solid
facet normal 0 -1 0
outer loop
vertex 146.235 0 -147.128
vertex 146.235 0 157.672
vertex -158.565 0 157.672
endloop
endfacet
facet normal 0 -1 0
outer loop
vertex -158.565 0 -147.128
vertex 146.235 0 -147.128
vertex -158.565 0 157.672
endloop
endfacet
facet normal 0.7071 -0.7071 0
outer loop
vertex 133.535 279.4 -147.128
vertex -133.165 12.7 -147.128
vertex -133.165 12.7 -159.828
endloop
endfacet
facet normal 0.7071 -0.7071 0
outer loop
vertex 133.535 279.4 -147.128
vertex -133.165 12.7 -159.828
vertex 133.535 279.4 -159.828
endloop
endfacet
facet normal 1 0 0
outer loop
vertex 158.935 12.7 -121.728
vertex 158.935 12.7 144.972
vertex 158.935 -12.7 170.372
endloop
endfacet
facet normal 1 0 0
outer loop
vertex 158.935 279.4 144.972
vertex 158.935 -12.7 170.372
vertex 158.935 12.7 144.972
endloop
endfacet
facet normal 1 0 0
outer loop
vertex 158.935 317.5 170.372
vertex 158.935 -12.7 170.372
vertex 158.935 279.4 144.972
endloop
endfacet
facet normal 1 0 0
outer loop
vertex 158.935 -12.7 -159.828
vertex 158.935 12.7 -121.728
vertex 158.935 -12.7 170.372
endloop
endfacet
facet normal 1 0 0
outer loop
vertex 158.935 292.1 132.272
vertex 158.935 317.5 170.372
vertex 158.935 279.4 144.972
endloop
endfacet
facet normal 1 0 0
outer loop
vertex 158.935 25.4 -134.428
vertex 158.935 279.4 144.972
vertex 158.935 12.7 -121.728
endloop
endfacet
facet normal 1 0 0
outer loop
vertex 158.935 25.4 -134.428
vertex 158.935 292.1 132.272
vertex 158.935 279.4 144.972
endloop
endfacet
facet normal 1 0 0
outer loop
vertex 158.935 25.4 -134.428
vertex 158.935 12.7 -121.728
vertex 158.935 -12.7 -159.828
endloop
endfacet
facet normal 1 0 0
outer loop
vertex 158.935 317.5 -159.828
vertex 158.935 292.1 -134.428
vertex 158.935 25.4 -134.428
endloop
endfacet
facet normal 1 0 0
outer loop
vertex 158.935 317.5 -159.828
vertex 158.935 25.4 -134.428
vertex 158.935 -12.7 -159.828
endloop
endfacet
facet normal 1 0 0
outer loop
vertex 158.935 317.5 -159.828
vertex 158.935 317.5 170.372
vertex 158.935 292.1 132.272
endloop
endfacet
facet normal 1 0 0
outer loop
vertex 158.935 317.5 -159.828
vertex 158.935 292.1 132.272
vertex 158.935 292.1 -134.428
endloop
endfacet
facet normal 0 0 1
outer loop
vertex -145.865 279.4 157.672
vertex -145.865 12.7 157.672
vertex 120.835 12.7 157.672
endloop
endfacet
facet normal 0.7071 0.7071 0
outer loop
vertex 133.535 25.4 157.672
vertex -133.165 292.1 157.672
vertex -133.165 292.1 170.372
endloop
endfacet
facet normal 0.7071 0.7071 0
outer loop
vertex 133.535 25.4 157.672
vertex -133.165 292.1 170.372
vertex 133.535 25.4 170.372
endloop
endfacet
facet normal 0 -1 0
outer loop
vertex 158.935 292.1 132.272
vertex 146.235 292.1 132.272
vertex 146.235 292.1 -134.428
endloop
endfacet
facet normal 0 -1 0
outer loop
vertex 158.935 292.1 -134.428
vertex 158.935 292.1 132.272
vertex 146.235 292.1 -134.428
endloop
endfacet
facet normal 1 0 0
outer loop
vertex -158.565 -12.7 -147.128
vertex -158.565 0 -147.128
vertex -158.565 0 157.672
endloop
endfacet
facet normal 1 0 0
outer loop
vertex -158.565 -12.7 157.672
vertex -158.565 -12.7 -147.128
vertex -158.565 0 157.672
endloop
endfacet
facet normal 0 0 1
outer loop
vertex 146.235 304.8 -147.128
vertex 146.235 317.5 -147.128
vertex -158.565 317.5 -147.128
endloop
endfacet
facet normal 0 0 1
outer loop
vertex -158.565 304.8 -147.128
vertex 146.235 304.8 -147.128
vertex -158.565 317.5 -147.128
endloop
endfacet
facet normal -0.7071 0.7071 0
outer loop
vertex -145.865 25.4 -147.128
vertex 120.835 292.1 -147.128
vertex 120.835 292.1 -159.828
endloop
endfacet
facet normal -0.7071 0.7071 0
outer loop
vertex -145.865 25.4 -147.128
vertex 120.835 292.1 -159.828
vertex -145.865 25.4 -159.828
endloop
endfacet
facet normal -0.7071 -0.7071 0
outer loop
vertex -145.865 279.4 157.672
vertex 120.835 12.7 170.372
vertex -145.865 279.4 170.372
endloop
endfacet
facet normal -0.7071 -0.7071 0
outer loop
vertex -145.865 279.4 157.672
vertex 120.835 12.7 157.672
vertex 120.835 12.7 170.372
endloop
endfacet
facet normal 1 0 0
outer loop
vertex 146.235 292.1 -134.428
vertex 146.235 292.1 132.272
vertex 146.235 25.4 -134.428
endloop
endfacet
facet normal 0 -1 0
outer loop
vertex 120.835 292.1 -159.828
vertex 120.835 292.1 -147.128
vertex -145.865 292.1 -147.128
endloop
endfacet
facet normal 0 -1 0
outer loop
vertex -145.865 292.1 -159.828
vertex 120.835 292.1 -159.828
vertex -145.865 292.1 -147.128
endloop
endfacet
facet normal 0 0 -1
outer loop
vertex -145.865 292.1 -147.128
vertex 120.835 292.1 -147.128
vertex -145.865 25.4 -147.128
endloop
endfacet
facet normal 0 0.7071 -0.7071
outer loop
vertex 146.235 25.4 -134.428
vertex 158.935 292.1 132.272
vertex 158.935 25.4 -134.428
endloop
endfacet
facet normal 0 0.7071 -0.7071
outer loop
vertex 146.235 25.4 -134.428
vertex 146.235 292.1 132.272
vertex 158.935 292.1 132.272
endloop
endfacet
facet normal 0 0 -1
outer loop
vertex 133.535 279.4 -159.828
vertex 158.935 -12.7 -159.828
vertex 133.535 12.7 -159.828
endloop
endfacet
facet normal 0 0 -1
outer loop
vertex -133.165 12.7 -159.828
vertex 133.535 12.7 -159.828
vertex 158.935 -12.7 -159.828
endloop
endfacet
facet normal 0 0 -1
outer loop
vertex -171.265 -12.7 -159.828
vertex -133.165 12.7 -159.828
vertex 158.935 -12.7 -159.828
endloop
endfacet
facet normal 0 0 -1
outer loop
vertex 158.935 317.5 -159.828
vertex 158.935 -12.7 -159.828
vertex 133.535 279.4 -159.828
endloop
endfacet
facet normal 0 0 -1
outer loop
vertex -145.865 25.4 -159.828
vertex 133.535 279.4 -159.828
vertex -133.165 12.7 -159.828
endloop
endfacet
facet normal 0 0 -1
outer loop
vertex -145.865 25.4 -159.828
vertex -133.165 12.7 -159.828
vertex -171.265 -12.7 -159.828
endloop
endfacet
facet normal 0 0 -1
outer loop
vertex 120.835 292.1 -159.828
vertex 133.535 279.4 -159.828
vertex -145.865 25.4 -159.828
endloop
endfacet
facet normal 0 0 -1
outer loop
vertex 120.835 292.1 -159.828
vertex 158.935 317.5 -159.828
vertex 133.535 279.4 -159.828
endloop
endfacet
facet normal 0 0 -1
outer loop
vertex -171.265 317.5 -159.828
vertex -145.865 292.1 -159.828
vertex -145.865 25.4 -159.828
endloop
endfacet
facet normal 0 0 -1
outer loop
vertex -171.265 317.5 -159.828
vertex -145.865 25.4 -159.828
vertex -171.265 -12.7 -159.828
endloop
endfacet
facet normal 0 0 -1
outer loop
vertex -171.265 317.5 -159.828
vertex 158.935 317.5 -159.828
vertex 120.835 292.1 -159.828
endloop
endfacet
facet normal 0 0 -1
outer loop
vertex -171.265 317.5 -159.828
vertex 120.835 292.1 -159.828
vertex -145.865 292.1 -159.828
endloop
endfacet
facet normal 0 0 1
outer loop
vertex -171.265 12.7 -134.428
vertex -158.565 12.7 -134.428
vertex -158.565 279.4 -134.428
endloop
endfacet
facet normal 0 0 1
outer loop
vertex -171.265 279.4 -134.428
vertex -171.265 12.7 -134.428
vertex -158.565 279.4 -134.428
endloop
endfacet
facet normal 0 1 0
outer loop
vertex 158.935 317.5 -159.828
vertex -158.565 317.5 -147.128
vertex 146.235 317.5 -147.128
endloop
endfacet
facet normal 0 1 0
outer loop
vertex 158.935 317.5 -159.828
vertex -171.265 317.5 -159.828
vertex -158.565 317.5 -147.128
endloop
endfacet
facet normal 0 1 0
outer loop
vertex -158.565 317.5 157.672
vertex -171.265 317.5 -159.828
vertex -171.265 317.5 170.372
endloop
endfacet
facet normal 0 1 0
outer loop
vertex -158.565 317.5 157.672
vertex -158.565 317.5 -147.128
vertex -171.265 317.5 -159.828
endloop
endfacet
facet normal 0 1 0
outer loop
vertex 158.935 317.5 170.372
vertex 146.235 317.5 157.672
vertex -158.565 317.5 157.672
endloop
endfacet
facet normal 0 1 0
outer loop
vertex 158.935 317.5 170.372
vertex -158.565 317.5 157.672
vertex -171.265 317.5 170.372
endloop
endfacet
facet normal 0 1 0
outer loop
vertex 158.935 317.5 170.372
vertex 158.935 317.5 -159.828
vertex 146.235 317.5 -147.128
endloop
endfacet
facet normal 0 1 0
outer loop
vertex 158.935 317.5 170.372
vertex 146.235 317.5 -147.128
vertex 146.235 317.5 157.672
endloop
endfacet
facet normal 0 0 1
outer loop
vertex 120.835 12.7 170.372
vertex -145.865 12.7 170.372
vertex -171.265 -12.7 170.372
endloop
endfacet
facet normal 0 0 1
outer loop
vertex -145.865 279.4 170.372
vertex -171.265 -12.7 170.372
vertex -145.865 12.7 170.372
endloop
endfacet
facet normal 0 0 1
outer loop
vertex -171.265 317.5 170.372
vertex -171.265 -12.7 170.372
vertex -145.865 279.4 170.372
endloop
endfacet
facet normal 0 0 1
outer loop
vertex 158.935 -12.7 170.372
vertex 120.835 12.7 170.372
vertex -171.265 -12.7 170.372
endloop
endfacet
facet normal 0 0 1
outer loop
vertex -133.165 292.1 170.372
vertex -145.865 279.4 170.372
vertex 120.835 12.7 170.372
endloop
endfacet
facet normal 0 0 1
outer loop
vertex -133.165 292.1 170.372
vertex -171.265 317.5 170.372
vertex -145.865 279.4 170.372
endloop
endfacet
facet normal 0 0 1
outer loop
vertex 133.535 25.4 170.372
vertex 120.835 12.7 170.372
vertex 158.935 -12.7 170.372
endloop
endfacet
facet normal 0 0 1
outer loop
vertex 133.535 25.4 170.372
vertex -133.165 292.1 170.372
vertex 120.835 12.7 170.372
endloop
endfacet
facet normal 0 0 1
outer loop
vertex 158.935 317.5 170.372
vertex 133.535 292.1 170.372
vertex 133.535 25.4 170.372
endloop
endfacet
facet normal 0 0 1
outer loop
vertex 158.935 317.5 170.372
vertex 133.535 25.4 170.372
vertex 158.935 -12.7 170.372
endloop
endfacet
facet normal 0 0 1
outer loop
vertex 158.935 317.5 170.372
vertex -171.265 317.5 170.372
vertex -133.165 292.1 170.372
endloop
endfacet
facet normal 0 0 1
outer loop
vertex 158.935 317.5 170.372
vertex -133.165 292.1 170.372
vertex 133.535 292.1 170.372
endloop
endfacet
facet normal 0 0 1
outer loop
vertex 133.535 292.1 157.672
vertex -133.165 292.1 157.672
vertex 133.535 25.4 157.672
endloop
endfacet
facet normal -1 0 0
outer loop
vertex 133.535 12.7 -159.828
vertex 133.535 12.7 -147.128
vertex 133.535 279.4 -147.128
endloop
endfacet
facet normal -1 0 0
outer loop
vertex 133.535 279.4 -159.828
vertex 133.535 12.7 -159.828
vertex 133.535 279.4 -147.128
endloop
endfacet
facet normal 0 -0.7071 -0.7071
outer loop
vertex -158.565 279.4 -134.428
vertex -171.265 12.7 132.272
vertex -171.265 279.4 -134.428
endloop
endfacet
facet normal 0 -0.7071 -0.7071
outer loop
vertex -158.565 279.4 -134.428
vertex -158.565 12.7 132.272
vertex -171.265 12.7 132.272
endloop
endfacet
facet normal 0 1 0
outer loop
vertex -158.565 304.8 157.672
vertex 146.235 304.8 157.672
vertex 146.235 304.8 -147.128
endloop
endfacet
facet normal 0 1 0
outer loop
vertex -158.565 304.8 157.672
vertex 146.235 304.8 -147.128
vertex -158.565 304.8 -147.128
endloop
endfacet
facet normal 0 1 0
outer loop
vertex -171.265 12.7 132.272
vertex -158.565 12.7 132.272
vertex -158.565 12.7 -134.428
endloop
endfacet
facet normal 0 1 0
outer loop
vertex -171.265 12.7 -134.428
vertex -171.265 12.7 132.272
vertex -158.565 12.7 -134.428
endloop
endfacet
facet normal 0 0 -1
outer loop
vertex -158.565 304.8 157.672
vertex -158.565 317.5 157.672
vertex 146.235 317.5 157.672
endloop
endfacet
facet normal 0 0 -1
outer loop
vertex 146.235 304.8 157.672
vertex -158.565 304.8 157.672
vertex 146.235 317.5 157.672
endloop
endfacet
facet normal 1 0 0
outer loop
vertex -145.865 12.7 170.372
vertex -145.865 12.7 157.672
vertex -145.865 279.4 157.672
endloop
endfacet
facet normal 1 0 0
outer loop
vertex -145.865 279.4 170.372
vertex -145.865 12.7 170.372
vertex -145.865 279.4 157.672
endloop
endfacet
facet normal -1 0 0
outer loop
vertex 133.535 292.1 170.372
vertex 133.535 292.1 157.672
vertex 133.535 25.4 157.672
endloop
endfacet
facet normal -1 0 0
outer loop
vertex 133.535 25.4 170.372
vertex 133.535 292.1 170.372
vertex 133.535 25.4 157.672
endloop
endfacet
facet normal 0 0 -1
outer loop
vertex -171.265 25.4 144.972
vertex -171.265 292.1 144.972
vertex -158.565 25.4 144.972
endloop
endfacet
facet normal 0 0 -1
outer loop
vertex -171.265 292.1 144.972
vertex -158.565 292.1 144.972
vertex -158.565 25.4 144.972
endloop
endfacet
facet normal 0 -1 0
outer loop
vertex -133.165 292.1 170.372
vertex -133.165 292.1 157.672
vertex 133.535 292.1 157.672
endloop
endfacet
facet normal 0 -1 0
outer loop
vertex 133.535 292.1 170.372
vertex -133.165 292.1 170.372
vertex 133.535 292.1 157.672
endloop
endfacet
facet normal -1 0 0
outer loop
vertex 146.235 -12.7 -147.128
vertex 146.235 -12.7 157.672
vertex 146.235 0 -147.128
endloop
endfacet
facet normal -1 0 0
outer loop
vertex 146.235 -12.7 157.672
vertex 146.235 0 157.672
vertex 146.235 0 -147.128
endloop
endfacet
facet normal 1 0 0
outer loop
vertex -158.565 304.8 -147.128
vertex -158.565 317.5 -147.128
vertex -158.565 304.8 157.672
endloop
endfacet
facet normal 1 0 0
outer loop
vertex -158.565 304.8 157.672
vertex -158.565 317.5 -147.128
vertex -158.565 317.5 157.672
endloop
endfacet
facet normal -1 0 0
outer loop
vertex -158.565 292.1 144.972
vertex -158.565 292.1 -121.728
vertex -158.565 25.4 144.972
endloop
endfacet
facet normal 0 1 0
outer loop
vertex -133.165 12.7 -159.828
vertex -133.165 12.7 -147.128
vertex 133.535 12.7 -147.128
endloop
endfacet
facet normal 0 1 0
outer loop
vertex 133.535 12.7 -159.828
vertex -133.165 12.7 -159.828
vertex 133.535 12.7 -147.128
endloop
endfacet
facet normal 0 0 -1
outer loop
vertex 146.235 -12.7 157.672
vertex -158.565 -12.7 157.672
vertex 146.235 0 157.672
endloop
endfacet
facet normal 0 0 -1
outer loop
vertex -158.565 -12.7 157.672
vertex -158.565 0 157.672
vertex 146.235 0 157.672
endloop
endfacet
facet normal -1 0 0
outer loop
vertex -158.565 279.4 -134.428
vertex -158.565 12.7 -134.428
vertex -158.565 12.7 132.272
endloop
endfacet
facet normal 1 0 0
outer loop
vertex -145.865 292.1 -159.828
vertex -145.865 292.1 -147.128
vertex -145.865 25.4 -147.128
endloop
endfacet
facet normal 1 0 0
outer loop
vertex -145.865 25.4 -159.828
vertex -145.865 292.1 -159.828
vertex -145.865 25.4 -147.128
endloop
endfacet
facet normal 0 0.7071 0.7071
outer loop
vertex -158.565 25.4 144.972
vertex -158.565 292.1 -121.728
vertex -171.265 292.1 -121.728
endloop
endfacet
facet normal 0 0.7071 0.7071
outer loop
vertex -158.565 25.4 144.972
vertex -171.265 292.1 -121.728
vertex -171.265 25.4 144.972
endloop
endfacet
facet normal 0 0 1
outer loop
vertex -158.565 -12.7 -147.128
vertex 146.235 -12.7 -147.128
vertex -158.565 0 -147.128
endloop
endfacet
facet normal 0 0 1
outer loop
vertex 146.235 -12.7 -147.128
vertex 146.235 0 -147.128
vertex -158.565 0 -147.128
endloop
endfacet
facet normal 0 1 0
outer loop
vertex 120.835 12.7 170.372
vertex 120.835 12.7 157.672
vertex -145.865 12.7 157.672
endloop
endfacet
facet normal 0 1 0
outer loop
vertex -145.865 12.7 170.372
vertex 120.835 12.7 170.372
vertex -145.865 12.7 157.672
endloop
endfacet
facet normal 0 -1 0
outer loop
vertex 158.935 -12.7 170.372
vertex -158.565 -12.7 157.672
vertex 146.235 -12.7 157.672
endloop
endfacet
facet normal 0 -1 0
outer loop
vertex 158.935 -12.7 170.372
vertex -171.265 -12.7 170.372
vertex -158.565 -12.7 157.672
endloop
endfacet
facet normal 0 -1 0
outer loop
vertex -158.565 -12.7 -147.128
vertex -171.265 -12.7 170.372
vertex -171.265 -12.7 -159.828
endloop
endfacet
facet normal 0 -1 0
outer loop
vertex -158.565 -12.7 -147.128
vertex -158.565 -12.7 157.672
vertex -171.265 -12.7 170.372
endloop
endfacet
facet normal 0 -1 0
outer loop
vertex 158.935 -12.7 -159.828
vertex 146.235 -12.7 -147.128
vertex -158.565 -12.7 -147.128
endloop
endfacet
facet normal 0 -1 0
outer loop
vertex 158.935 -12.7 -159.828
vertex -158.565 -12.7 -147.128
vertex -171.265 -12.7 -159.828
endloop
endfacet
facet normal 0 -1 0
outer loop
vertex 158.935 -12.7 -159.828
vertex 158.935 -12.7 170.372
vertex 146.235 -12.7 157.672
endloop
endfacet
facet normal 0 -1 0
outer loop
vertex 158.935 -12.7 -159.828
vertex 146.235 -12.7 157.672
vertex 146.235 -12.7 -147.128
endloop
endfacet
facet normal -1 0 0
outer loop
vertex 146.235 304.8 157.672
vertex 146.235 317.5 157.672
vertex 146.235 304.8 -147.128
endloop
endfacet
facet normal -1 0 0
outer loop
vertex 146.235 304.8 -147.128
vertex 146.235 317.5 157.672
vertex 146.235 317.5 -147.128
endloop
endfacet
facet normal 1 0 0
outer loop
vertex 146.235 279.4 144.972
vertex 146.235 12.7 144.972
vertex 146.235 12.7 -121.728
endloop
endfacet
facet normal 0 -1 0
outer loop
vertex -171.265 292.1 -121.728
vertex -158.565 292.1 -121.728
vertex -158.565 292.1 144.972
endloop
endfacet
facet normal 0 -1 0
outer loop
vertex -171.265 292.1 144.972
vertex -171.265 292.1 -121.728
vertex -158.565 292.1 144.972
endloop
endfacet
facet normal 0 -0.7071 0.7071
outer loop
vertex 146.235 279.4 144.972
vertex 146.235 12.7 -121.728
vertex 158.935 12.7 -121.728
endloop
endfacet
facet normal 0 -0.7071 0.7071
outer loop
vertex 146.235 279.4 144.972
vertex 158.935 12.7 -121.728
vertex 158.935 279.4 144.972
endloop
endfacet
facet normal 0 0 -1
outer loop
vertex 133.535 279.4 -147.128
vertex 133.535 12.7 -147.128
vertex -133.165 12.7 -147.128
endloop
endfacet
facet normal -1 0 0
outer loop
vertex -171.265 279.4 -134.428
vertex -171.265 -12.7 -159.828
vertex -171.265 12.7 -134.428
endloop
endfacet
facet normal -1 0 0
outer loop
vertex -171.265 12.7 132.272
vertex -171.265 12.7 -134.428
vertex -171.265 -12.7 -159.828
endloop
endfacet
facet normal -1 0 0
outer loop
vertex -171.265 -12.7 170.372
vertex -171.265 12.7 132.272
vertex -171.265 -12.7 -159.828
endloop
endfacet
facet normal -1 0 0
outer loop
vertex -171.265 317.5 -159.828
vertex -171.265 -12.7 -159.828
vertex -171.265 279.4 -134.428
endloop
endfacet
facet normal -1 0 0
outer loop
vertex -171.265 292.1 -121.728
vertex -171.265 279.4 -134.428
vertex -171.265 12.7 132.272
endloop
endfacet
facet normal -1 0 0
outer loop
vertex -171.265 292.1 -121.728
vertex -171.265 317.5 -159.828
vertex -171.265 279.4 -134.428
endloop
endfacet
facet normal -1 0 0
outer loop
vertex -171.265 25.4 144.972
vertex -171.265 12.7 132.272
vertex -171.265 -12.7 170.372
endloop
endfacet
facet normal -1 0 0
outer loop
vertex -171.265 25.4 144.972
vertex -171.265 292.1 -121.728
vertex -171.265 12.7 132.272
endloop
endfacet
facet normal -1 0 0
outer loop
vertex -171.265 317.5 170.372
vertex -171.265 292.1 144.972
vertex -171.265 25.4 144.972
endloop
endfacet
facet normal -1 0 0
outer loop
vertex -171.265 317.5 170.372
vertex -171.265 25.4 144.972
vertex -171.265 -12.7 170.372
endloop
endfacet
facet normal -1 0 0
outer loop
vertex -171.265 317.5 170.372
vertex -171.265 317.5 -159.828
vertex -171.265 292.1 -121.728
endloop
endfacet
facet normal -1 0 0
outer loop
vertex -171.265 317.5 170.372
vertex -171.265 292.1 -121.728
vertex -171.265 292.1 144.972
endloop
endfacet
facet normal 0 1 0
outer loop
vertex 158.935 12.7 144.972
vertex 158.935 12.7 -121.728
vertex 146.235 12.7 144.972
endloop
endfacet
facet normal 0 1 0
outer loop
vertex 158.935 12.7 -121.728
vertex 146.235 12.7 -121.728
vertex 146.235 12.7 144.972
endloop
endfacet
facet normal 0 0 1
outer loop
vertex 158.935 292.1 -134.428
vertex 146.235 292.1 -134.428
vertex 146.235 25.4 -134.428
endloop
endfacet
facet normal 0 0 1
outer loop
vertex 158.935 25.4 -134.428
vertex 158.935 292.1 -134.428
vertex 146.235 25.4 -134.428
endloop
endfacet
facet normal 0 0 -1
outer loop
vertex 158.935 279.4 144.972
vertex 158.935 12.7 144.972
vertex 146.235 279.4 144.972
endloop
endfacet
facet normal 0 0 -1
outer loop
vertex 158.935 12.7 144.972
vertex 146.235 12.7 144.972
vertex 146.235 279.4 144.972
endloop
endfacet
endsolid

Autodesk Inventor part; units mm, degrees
ref_plane "YZ Plane" through (0, 0, 0) normal (1, 0, 0) x (0, 1, 0)
ref_plane "XZ Plane" through (0, 0, 0) normal (0, 1, 0) x (-1, 0, 0)
ref_plane "XY Plane" through (0, 0, 0) normal (0, 0, 1) x (1, 0, 0)
sketch "Sketch1" plane through (0, 0, 0) normal (0, 1, 0) x (-1, 0, 0)
  line L0 (158.5647, 157.6724) -> (-146.2353, 157.6724)
  line L1 (-146.2353, 157.6724) -> (-146.2353, -147.1276)
  line L2 (-146.2353, -147.1276) -> (158.5647, -147.1276)
  line L3 (158.5647, -147.1276) -> (158.5647, 157.6724)
  point P0 (0, 0)
  dimension "d0" = 304.8
  dimension "d1" = 304.8
extrude "Extrusion1" add sketch "Sketch1" along normal blind 304.8
sketch "Sketch2" plane through (146.2353, 0, 157.6724) normal (1, 0, 0) x (0, 0, -1)
  line L0 (-12.7, 317.5) -> (317.5, 317.5)
  line L1 (317.5, 317.5) -> (317.5, -12.7)
  line L2 (317.5, -12.7) -> (-12.7, -12.7)
  line L3 (-12.7, -12.7) -> (-12.7, 317.5)
  line L4 (0, 304.8) -> (304.8, 304.8) projected
  line L5 (0, 0) -> (0, 304.8) projected
  line L6 (12.7, 292.1) -> (292.1, 292.1)
  line L7 (292.1, 292.1) -> (292.1, 12.7)
  line L8 (292.1, 12.7) -> (12.7, 12.7)
  line L9 (12.7, 12.7) -> (12.7, 292.1)
  line L10 (25.4, 292.1) -> (292.1, 25.4)
  line L11 (279.4, 12.7) -> (12.7, 279.4)
  point P0 (157.6724, 0)
  dimension "d4" = 330.2
  dimension "d5" = 330.2
  dimension "d6" = 12.7
  dimension "d7" = 12.7
  dimension "d8" = 25.4
  dimension "d9" = 25.4
  dimension "d10" = 25.4
  dimension "d11" = 25.4
  dimension "d17" = 12.7
  dimension "d18" = 12.7
  dimension "d19" = 12.7
extrude "Extrusion2" add sketch "Sketch2" along normal blind 12.7 contours L0 L1 L2 L3 | L6 L10 L7 L8 L11 L9
ref_plane "Work Plane1" through (-6.1647, 0, -147.1276) normal (-1, 0, 0) x (0, 0, 1)
ref_plane "Work Plane2" through (-158.5647, 0, 5.2724) normal (0, 0, 1) x (1, 0, 0)
pattern_circular "Circular Pattern1" count 4 over 360 about axis through (-6.1647, 0, 5.2724) along (0, 1, 0) of "Extrusion2"
properties part number "cargoPrototype" material "Wood (Maple)"
